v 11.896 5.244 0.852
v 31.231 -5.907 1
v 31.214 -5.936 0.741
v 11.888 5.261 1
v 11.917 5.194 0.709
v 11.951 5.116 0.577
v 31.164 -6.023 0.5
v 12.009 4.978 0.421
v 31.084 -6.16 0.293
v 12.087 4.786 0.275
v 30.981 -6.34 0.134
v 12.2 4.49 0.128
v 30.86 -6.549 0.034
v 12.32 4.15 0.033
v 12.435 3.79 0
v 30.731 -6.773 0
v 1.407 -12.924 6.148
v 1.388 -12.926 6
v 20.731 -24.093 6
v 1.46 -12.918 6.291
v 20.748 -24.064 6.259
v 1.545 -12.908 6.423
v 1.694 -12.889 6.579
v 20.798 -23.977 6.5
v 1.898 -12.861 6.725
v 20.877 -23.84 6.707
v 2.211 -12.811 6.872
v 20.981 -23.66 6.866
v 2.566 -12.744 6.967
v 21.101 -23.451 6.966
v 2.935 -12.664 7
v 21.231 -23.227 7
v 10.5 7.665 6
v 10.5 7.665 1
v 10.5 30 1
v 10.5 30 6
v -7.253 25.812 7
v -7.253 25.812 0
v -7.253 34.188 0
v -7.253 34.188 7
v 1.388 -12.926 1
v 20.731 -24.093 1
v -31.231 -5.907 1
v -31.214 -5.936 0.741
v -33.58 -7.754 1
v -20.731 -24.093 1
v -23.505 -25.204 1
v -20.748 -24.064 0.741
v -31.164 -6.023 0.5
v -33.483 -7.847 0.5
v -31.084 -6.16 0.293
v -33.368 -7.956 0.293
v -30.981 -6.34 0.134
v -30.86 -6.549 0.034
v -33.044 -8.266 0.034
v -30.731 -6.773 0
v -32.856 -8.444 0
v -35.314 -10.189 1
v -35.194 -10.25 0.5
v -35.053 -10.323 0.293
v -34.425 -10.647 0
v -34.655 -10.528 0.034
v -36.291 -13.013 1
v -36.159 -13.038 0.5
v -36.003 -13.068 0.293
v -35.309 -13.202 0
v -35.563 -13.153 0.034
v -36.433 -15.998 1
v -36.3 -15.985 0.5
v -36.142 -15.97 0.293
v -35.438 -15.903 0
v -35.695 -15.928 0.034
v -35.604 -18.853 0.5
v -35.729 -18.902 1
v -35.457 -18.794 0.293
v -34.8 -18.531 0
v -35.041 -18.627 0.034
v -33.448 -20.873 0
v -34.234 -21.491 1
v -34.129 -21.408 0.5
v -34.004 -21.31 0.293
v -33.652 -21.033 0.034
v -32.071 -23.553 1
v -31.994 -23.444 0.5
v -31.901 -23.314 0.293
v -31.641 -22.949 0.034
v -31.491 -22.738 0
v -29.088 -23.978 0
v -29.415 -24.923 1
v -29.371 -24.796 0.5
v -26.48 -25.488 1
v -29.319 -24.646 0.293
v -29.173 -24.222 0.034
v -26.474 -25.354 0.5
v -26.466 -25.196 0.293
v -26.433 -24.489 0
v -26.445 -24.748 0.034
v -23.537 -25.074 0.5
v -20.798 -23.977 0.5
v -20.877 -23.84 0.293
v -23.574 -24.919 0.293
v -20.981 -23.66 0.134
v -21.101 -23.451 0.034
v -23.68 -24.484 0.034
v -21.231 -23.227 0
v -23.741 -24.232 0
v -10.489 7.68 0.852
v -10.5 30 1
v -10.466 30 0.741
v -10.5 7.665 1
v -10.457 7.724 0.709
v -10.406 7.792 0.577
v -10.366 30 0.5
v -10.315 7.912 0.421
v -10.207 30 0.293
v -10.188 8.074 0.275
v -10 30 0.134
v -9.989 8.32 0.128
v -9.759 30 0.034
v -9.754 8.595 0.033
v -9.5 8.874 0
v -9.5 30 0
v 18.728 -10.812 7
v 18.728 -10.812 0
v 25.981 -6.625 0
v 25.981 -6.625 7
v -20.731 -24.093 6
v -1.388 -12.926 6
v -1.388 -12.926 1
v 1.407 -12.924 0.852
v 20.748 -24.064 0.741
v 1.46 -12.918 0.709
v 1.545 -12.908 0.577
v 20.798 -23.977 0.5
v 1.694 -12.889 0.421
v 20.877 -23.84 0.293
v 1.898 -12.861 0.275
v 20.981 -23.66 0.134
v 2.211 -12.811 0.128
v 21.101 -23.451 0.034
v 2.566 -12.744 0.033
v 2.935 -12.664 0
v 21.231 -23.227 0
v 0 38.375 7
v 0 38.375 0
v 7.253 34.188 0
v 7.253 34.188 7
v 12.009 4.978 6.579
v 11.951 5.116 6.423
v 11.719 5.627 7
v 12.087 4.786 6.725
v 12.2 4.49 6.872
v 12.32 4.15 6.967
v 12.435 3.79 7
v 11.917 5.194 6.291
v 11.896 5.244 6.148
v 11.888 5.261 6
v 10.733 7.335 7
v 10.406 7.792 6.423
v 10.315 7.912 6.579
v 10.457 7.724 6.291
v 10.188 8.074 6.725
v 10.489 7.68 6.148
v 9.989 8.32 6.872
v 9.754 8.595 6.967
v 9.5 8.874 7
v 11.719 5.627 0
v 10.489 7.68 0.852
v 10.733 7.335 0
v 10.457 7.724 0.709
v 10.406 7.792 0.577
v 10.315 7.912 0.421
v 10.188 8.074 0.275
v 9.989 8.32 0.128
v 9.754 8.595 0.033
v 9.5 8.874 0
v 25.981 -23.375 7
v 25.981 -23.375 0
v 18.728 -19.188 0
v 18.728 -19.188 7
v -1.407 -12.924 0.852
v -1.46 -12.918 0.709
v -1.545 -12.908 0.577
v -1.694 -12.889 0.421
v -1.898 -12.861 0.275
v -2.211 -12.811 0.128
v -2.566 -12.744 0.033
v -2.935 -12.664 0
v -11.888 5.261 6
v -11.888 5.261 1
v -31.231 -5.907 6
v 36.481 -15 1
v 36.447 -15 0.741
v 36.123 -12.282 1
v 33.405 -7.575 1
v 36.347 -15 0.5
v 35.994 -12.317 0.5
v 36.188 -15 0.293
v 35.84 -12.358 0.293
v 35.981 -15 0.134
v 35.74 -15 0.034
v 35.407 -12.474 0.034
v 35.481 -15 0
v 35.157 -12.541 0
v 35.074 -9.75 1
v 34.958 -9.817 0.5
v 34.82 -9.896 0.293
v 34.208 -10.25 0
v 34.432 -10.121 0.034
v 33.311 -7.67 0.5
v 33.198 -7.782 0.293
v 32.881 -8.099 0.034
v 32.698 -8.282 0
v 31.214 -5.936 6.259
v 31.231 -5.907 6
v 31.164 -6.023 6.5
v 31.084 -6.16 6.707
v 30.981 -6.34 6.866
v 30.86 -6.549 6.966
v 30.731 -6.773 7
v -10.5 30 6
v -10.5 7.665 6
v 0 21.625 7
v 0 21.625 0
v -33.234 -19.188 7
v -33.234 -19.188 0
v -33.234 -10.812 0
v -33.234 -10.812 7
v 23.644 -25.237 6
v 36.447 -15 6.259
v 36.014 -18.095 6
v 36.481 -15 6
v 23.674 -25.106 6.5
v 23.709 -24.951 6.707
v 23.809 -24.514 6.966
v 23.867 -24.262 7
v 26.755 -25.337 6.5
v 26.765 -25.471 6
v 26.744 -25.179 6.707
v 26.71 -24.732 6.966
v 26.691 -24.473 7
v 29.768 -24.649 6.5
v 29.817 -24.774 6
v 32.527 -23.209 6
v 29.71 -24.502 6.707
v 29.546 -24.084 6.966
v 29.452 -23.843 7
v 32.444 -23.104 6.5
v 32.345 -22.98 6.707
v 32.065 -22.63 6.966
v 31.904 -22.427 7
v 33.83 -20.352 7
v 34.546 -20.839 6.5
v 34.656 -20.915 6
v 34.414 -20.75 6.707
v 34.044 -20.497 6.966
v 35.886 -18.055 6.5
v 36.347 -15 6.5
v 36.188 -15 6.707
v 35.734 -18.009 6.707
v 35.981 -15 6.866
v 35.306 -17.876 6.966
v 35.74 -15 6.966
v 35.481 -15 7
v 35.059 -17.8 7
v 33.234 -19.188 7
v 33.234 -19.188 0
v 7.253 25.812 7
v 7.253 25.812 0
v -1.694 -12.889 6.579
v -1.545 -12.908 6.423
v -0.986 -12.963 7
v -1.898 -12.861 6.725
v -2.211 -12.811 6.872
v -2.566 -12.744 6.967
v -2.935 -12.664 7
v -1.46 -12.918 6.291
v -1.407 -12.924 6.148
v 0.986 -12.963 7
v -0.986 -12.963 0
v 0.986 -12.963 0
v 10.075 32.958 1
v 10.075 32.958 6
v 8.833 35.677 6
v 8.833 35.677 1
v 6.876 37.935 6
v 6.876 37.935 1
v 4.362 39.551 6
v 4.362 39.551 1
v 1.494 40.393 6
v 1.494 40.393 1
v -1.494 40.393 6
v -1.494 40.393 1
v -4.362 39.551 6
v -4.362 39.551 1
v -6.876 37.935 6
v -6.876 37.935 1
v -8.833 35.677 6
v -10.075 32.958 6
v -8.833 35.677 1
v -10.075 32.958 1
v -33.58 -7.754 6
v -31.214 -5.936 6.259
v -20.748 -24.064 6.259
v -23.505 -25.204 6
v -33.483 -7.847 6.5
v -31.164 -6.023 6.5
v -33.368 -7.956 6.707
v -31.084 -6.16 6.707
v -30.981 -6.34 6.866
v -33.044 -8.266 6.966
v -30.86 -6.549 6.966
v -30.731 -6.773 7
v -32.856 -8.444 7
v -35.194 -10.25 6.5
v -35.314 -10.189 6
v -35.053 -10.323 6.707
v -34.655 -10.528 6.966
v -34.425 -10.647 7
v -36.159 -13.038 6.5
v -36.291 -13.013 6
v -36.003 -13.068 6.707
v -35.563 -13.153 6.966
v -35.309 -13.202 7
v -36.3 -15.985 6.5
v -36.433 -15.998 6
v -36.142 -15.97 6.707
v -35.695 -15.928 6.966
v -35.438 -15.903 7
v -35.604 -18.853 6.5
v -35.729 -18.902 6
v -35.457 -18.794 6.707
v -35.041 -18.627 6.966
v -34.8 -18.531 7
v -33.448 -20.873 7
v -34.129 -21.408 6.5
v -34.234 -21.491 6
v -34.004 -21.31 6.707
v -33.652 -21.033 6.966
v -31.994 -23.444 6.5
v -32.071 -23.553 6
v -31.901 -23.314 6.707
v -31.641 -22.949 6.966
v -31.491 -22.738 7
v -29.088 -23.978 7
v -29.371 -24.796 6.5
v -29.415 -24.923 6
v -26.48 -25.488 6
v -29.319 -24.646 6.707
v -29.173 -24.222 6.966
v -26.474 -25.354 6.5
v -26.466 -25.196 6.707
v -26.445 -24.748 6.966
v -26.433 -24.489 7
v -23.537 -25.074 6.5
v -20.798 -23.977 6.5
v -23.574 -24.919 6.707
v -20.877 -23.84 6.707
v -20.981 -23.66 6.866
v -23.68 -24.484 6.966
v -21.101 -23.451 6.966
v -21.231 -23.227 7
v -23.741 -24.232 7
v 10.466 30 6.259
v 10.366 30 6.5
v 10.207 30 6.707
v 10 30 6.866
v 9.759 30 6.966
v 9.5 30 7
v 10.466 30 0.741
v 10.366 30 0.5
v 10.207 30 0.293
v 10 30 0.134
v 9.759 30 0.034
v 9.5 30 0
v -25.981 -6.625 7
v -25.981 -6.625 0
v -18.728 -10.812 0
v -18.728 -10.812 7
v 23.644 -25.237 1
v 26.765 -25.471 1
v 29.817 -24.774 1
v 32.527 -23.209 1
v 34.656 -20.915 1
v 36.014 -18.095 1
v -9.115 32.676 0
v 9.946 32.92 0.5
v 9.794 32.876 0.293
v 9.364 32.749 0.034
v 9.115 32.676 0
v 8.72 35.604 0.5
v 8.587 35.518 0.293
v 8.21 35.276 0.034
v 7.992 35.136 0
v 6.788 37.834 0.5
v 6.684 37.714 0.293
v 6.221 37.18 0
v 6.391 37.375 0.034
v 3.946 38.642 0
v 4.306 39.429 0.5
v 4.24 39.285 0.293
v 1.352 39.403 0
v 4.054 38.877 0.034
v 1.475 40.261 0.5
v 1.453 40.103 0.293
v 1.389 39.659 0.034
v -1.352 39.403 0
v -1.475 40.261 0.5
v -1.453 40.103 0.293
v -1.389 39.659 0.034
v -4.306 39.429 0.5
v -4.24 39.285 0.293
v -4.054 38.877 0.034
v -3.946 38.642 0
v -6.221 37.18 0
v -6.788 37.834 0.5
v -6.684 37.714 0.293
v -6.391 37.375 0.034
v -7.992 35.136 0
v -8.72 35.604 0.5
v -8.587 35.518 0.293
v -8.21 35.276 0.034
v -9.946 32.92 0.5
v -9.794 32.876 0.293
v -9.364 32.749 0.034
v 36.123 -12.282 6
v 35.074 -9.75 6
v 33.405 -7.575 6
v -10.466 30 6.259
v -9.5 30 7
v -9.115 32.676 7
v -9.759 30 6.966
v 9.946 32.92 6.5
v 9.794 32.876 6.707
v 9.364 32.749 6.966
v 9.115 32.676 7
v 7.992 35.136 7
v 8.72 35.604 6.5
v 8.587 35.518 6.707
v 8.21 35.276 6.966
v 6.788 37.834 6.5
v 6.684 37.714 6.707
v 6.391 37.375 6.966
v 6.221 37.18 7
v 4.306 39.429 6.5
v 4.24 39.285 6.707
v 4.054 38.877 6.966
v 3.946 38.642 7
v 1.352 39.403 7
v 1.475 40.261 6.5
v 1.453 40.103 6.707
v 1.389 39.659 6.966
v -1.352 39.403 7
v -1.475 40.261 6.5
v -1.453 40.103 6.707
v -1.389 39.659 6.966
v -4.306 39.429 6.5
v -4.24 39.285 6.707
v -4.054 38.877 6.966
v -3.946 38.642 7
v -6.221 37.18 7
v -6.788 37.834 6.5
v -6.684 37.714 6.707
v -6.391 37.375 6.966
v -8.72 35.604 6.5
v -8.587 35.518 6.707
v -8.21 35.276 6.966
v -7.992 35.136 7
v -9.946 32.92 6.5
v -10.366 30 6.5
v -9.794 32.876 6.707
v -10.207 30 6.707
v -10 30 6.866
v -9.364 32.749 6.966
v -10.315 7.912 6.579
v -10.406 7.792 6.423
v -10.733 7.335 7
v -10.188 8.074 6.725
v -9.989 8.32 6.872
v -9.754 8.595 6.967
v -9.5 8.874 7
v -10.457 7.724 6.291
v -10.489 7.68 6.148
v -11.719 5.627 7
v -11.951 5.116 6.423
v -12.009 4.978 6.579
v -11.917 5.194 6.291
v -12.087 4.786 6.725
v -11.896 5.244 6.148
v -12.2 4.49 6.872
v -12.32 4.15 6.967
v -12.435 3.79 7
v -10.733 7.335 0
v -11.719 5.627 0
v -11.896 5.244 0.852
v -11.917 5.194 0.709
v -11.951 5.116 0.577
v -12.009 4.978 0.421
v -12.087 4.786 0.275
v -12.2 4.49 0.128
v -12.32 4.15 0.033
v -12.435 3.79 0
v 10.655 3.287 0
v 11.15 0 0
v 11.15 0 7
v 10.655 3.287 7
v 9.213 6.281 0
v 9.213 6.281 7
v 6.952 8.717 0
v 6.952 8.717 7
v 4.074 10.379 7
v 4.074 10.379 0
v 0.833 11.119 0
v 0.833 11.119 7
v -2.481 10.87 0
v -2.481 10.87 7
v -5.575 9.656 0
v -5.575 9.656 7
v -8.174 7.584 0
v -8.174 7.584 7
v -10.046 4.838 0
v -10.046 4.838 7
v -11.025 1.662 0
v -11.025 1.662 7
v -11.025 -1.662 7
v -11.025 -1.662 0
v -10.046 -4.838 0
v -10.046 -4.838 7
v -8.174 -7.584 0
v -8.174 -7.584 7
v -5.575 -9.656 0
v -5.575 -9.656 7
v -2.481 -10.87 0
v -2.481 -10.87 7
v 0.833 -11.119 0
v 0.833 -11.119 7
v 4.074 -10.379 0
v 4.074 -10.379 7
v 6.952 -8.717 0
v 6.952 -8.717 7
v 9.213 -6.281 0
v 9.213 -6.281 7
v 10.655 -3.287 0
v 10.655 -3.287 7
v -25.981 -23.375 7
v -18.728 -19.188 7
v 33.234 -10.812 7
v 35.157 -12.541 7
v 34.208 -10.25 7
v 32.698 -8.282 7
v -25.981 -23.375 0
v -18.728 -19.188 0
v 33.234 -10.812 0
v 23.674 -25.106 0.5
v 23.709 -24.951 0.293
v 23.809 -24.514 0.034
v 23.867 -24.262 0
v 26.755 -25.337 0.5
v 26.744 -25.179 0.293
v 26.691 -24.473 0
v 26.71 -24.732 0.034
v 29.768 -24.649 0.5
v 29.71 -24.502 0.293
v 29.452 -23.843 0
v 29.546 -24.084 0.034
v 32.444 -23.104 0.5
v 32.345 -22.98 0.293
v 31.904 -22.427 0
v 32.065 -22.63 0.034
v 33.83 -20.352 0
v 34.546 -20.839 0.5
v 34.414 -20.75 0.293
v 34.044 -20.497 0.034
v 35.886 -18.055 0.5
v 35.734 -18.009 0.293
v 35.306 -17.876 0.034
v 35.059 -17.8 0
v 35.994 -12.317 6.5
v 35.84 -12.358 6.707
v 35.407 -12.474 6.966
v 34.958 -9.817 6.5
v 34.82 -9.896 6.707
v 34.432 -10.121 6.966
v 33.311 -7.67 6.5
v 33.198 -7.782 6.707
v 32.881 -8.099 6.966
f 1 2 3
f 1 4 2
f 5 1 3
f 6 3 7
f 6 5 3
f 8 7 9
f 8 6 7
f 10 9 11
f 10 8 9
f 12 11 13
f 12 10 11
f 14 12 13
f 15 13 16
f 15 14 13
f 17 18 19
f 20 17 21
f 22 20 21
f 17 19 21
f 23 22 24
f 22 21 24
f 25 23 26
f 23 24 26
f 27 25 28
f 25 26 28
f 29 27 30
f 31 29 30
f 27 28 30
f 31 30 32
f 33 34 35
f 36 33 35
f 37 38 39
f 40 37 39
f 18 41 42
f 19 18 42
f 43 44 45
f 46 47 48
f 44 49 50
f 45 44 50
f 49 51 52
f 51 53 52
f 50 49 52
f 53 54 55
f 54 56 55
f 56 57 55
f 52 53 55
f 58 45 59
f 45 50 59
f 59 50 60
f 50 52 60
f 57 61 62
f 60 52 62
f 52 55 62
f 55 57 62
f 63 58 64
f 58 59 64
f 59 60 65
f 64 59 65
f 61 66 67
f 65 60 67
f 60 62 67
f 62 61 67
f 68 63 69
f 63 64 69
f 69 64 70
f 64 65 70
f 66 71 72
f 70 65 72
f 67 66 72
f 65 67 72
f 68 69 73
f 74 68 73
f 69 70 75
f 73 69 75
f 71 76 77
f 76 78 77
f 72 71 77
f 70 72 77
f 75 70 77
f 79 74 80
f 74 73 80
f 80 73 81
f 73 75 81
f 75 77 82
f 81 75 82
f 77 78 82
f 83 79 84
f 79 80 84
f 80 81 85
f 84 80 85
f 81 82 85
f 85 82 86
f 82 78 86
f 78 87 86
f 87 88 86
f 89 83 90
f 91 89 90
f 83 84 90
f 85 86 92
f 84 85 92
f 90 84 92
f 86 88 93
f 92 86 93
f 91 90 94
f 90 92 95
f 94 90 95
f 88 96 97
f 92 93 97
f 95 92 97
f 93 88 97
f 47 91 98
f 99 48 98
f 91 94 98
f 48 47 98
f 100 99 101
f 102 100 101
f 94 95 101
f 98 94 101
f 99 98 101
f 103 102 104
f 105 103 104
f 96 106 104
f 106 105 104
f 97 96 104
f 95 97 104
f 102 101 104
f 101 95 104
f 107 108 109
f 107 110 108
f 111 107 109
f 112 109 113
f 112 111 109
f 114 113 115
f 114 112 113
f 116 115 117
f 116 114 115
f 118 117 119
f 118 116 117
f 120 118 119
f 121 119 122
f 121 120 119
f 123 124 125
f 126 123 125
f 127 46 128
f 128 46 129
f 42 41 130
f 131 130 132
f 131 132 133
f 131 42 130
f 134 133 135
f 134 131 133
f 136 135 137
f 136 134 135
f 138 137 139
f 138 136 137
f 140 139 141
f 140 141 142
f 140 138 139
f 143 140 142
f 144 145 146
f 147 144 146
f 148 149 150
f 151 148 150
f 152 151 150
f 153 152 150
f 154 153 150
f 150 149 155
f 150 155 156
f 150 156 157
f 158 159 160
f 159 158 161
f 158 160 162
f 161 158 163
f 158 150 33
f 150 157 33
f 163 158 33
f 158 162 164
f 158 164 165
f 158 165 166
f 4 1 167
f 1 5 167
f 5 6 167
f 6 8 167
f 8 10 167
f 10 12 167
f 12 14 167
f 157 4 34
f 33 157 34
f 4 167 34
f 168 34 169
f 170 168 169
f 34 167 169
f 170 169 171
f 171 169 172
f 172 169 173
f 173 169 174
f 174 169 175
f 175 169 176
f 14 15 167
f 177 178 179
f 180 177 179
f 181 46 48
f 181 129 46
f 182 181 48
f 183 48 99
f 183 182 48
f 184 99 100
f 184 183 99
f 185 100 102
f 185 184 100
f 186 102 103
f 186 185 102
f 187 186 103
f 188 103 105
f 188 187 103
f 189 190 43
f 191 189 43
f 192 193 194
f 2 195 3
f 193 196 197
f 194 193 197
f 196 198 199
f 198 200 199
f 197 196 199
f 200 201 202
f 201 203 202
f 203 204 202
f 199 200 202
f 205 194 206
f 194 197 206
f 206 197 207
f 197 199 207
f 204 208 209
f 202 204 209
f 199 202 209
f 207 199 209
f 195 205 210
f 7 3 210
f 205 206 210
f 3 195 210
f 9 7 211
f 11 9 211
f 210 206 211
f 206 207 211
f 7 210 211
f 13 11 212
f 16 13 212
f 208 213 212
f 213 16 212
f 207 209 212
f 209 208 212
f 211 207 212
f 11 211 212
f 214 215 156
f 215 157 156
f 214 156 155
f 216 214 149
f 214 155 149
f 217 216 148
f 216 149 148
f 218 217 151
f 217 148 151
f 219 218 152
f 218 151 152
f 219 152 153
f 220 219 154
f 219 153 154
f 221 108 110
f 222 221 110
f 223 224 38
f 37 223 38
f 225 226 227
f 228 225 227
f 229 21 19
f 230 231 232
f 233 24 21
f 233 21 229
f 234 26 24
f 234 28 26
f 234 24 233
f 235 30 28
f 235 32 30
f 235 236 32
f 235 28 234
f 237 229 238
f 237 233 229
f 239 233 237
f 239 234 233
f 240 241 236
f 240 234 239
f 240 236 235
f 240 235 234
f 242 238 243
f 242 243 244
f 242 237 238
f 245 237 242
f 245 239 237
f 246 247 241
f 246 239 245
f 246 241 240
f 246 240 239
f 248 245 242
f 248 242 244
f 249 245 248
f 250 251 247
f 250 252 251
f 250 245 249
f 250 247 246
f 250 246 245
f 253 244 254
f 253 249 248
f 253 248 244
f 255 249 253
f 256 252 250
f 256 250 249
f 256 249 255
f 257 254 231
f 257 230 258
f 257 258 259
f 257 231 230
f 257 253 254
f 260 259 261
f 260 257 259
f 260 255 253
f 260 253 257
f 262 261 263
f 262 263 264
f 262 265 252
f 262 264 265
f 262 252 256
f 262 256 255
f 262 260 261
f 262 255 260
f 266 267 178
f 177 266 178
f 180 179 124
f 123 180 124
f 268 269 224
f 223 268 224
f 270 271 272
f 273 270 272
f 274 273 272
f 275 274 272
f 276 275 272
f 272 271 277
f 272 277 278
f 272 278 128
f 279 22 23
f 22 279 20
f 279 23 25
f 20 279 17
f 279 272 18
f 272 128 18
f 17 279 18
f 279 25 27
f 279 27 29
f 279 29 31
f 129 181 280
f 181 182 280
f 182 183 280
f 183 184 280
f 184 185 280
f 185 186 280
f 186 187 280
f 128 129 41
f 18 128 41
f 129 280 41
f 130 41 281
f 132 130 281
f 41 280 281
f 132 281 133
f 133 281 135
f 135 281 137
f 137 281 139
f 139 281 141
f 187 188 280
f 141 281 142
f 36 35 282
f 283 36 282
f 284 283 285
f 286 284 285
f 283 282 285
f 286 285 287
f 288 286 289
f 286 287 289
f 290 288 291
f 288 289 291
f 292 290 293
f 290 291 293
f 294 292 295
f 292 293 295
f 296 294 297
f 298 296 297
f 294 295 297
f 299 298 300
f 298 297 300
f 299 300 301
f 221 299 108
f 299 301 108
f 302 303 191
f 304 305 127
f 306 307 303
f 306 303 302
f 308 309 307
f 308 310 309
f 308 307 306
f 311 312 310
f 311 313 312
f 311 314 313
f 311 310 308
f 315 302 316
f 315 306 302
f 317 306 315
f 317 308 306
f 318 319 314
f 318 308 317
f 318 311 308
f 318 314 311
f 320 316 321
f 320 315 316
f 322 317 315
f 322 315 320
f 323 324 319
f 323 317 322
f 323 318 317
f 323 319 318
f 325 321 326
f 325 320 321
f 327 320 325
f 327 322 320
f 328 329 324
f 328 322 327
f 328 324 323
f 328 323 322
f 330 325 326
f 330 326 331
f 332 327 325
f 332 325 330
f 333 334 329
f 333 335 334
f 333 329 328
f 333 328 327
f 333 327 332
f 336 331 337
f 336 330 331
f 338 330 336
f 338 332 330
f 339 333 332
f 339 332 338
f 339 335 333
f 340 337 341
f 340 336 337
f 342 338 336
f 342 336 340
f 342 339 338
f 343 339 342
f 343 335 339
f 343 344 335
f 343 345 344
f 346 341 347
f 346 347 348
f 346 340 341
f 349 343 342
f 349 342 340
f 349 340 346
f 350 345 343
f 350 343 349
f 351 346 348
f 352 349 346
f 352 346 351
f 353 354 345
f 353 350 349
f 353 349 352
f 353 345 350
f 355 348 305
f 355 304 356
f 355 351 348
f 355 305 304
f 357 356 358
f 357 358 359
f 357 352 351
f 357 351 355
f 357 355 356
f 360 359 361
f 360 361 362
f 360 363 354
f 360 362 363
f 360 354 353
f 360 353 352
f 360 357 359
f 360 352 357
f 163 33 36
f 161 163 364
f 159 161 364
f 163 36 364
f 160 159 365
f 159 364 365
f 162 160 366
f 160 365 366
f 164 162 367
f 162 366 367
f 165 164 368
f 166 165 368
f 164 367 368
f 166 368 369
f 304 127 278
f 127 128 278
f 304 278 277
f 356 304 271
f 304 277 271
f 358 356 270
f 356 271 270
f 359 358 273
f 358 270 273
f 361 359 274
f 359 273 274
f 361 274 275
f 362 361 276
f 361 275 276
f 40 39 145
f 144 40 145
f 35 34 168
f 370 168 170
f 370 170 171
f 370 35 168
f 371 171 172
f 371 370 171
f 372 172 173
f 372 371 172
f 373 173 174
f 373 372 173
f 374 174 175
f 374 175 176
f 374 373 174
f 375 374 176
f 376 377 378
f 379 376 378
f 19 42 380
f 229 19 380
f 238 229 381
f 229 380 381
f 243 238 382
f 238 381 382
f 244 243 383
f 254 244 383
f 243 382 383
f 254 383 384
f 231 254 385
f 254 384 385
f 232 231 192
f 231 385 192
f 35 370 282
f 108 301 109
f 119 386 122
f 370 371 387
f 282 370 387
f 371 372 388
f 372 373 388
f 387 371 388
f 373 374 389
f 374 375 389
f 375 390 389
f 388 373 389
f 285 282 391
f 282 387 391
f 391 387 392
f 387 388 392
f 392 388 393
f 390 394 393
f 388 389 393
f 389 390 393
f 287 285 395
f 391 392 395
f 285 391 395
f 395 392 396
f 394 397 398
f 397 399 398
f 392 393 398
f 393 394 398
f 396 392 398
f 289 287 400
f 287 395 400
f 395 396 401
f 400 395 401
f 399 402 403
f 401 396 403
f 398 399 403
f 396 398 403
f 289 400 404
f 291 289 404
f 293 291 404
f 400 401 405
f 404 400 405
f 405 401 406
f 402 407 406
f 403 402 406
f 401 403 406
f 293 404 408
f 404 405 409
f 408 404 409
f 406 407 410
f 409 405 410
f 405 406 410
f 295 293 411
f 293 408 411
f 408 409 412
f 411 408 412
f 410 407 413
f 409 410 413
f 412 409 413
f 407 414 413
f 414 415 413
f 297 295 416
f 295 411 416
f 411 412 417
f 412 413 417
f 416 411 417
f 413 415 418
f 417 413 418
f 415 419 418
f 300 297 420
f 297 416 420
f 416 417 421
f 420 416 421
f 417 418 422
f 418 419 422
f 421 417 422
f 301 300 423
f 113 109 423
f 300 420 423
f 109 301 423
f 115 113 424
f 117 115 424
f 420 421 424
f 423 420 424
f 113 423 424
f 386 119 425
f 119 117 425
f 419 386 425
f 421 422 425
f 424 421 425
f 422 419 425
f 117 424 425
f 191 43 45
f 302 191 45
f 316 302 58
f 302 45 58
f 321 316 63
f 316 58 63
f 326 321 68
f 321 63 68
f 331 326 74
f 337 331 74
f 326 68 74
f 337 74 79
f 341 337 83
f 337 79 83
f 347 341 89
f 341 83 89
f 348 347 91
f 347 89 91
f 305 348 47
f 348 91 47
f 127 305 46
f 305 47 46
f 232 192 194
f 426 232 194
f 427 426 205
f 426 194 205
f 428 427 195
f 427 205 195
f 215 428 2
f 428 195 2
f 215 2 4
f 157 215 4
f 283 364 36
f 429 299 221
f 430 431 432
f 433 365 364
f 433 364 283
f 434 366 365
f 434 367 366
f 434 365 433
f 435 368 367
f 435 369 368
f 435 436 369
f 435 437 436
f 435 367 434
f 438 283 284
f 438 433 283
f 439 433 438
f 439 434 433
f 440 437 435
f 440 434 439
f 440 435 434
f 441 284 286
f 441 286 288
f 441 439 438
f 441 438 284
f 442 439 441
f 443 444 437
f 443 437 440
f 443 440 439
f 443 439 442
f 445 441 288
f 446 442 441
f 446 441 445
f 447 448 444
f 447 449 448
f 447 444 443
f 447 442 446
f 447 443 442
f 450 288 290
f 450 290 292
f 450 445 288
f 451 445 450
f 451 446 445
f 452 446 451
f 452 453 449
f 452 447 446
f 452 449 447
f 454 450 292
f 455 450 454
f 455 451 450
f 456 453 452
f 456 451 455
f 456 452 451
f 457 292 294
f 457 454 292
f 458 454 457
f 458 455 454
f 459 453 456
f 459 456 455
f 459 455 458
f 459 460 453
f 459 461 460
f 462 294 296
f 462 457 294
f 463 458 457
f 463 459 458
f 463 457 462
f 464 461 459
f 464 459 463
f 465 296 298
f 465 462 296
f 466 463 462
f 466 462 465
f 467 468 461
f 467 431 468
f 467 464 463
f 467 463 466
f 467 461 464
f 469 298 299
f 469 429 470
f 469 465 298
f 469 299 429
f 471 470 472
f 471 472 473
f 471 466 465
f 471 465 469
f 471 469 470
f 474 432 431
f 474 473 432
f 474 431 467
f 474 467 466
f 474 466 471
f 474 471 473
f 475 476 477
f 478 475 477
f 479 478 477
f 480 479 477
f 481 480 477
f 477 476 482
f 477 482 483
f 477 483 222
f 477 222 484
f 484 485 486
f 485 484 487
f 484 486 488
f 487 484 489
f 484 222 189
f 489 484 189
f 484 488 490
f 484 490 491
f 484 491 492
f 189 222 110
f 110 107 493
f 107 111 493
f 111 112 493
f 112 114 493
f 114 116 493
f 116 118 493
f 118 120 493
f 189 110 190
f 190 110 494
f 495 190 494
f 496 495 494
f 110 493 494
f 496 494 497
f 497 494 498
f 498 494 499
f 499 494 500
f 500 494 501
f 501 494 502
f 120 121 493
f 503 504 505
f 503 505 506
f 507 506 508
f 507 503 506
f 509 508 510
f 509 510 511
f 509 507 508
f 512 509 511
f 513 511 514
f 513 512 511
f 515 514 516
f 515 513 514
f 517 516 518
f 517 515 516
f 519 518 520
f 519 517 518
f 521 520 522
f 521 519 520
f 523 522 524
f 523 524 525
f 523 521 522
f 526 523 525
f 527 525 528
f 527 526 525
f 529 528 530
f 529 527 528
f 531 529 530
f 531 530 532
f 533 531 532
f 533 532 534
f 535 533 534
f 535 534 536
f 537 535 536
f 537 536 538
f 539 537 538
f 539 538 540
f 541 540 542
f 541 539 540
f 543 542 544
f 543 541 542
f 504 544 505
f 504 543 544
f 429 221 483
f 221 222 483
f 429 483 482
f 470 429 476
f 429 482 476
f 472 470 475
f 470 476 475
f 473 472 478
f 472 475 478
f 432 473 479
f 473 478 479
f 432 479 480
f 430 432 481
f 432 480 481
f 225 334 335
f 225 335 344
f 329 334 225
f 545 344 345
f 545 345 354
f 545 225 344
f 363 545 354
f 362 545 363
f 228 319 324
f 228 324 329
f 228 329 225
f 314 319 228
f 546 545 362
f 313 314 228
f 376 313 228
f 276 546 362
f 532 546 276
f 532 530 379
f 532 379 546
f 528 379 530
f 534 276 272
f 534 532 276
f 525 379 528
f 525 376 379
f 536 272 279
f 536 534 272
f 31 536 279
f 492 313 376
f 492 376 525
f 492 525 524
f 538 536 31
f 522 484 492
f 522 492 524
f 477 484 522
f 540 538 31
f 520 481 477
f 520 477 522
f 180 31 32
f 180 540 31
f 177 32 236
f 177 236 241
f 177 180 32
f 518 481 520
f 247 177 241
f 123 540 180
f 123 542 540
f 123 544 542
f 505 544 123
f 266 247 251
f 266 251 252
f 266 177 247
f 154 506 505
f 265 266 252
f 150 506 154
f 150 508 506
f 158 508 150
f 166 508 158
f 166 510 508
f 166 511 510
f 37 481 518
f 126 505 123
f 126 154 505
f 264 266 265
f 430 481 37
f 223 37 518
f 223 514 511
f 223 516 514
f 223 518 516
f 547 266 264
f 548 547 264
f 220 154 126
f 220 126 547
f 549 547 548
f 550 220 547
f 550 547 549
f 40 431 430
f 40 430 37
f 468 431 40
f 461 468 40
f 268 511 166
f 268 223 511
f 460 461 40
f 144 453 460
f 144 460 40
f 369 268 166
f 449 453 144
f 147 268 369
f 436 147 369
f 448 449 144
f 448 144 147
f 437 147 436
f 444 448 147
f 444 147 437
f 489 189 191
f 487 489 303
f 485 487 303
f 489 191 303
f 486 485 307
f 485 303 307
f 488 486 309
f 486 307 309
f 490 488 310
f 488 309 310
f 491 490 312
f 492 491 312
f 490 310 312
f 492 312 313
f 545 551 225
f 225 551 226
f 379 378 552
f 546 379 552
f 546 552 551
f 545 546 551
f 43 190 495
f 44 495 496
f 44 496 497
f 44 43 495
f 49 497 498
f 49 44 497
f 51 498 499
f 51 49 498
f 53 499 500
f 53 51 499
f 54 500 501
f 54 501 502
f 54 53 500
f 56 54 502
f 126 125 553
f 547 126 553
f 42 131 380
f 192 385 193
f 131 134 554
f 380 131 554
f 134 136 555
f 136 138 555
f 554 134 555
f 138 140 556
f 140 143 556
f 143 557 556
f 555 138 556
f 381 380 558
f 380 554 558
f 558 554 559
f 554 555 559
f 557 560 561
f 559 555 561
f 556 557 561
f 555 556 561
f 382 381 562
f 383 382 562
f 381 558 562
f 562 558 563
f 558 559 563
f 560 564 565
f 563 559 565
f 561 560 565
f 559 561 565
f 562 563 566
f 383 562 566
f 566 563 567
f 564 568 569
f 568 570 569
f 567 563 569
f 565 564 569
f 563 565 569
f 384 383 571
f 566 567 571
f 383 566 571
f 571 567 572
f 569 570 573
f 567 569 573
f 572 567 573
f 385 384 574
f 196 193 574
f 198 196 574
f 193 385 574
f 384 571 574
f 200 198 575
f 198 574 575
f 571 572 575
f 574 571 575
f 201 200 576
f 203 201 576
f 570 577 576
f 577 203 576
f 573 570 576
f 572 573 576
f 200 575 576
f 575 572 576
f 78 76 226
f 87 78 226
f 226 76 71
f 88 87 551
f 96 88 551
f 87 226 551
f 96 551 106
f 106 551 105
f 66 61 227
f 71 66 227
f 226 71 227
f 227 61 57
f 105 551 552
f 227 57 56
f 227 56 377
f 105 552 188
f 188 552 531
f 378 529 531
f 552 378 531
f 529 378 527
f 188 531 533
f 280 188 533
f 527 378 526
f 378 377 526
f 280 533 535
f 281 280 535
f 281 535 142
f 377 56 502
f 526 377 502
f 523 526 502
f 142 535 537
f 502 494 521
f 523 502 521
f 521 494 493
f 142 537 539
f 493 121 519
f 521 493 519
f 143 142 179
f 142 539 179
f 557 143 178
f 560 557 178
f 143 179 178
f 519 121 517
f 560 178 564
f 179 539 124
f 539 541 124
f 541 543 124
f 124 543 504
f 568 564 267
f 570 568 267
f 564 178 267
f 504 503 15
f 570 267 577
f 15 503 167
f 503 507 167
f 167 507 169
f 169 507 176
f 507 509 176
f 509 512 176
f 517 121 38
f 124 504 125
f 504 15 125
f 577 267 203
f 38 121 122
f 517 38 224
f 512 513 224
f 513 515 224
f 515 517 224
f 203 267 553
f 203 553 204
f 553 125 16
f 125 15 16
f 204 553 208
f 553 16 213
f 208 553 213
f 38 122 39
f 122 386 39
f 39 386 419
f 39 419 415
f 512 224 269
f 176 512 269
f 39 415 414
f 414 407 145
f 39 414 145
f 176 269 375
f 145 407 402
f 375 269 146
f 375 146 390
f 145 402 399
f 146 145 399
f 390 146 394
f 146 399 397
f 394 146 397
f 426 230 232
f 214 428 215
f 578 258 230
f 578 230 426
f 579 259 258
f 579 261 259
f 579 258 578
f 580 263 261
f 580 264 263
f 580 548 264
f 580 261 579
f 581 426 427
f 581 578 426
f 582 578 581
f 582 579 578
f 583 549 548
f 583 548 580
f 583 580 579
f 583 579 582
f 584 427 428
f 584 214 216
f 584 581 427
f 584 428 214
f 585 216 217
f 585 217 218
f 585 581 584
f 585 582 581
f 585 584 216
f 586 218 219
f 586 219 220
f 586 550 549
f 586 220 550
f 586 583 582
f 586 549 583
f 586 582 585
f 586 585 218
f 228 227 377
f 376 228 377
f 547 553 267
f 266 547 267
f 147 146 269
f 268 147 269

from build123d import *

# Parameters (mm, degrees)
F0_R     = 11.15
F1_DEPTH = 7
F2_R     = 1


with BuildPart() as f1:
    # F0 (on Top) → F1 (new body)
    with BuildSketch(Plane.XY):
        with BuildLine():
            ThreePointArc((1.3879590237, -12.9256941689), (9.6706635581, -8.6878228772), (13, 0))
            ThreePointArc((13, 0), (12.7189517514, 2.6885435362), (11.8879590237, 5.2608393105))
            ThreePointArc((11.8879590237, 5.2608393105), (11.2583302492, 6.5), (10.5, 7.6648548584))
            ThreePointArc((10.5, 7.6648548584), (0, 13), (-10.5, 7.6648548584))
            ThreePointArc((-10.5, 7.6648548584), (-11.2583302492, 6.5), (-11.8879590237, 5.2608393105))
            ThreePointArc((-11.8879590237, 5.2608393105), (-11.2583302492, -6.5), (-1.3879590237, -12.9256941689))
            ThreePointArc((-1.3879590237, -12.9256941689), (0, -13), (1.3879590237, -12.9256941689))
        make_face()
        Circle(F0_R, mode=Mode.SUBTRACT)
        with BuildLine():
            ThreePointArc((11.8879590237, 5.2608393105), (12.7189517514, 2.6885435362), (13, 0))
            ThreePointArc((13, 0), (9.6706635581, -8.6878228772), (1.3879590237, -12.9256941689))
            Line((1.3879590237, -12.9256941689), (20.7307621135, -24.0932667397))
            ThreePointArc((20.7307621135, -24.0932667397), (16.8874953738, -9.75), (31.2307621135, -5.9067332603))
            Line((31.2307621135, -5.9067332603), (11.8879590237, 5.2608393105))
        make_face()
        with BuildLine():
            ThreePointArc((-10.5, 7.6648548584), (0, 13), (10.5, 7.6648548584))
            Line((10.5, 7.6648548584), (10.5, 30))
            ThreePointArc((10.5, 30), (0, 19.5), (-10.5, 30))
            Line((-10.5, 30), (-10.5, 7.6648548584))
        make_face()
        with BuildLine():
            ThreePointArc((36.4807621135, -15), (35.0740288533, -9.75), (31.2307621135, -5.9067332603))
            ThreePointArc((31.2307621135, -5.9067332603), (16.8874953738, -9.75), (20.7307621135, -24.0932667397))
            ThreePointArc((20.7307621135, -24.0932667397), (31.2307621135, -24.0932667397), (36.4807621135, -15))
        make_face()
        Polygon((33.2337248702, -10.8125), (33.2337248702, -19.1875), (25.9807621135, -23.375), (18.7277993568, -19.1875), (18.7277993568, -10.8125), (25.9807621135, -6.625), align=None, mode=Mode.SUBTRACT)
        with BuildLine():
            Line((-20.7307621135, -24.0932667397), (-1.3879590237, -12.9256941689))
            ThreePointArc((-1.3879590237, -12.9256941689), (-11.2583302492, -6.5), (-11.8879590237, 5.2608393105))
            Line((-11.8879590237, 5.2608393105), (-31.2307621135, -5.9067332603))
            ThreePointArc((-31.2307621135, -5.9067332603), (-20.7307621135, -5.9067332603), (-15.4807621135, -15))
            ThreePointArc((-15.4807621135, -15), (-16.8874953738, -20.25), (-20.7307621135, -24.0932667397))
        make_face()
        with BuildLine():
            ThreePointArc((-10.5, 30), (0, 19.5), (10.5, 30))
            ThreePointArc((10.5, 30), (0, 40.5), (-10.5, 30))
        make_face()
        Polygon((0, 38.375), (7.2529627567, 34.1875), (7.2529627567, 25.8125), (0, 21.625), (-7.2529627567, 25.8125), (-7.2529627567, 34.1875), align=None, mode=Mode.SUBTRACT)
        with BuildLine():
            ThreePointArc((-31.2307621135, -5.9067332603), (-35.0740288533, -20.25), (-20.7307621135, -24.0932667397))
            ThreePointArc((-20.7307621135, -24.0932667397), (-16.8874953738, -20.25), (-15.4807621135, -15))
            ThreePointArc((-15.4807621135, -15), (-20.7307621135, -5.9067332603), (-31.2307621135, -5.9067332603))
        make_face()
        Polygon((-25.9807621135, -23.375), (-33.2337248702, -19.1875), (-33.2337248702, -10.8125), (-25.9807621135, -6.625), (-18.7277993568, -10.8125), (-18.7277993568, -19.1875), align=None, mode=Mode.SUBTRACT)
    extrude(amount=F1_DEPTH)

    # F2
    f2_edges = [f1.edges().sort_by_distance(p)[0] for p in [
        (-21.559361, -0.322947, 7),
        (11.059361, -18.50948, 7),
        (21.559361, -0.322947, 7),
        (10.5, 18.832427, 7),
        (-10.5, 18.832427, 7),
        (-11.059361, -18.50948, 7),
        (11.059361, -18.50948, 0),
        (-11.059361, -18.50948, 0),
        (-10.5, 18.832427, 0),
    ]]
    fillet(f2_edges, radius=F2_R)


solid = f1.part
